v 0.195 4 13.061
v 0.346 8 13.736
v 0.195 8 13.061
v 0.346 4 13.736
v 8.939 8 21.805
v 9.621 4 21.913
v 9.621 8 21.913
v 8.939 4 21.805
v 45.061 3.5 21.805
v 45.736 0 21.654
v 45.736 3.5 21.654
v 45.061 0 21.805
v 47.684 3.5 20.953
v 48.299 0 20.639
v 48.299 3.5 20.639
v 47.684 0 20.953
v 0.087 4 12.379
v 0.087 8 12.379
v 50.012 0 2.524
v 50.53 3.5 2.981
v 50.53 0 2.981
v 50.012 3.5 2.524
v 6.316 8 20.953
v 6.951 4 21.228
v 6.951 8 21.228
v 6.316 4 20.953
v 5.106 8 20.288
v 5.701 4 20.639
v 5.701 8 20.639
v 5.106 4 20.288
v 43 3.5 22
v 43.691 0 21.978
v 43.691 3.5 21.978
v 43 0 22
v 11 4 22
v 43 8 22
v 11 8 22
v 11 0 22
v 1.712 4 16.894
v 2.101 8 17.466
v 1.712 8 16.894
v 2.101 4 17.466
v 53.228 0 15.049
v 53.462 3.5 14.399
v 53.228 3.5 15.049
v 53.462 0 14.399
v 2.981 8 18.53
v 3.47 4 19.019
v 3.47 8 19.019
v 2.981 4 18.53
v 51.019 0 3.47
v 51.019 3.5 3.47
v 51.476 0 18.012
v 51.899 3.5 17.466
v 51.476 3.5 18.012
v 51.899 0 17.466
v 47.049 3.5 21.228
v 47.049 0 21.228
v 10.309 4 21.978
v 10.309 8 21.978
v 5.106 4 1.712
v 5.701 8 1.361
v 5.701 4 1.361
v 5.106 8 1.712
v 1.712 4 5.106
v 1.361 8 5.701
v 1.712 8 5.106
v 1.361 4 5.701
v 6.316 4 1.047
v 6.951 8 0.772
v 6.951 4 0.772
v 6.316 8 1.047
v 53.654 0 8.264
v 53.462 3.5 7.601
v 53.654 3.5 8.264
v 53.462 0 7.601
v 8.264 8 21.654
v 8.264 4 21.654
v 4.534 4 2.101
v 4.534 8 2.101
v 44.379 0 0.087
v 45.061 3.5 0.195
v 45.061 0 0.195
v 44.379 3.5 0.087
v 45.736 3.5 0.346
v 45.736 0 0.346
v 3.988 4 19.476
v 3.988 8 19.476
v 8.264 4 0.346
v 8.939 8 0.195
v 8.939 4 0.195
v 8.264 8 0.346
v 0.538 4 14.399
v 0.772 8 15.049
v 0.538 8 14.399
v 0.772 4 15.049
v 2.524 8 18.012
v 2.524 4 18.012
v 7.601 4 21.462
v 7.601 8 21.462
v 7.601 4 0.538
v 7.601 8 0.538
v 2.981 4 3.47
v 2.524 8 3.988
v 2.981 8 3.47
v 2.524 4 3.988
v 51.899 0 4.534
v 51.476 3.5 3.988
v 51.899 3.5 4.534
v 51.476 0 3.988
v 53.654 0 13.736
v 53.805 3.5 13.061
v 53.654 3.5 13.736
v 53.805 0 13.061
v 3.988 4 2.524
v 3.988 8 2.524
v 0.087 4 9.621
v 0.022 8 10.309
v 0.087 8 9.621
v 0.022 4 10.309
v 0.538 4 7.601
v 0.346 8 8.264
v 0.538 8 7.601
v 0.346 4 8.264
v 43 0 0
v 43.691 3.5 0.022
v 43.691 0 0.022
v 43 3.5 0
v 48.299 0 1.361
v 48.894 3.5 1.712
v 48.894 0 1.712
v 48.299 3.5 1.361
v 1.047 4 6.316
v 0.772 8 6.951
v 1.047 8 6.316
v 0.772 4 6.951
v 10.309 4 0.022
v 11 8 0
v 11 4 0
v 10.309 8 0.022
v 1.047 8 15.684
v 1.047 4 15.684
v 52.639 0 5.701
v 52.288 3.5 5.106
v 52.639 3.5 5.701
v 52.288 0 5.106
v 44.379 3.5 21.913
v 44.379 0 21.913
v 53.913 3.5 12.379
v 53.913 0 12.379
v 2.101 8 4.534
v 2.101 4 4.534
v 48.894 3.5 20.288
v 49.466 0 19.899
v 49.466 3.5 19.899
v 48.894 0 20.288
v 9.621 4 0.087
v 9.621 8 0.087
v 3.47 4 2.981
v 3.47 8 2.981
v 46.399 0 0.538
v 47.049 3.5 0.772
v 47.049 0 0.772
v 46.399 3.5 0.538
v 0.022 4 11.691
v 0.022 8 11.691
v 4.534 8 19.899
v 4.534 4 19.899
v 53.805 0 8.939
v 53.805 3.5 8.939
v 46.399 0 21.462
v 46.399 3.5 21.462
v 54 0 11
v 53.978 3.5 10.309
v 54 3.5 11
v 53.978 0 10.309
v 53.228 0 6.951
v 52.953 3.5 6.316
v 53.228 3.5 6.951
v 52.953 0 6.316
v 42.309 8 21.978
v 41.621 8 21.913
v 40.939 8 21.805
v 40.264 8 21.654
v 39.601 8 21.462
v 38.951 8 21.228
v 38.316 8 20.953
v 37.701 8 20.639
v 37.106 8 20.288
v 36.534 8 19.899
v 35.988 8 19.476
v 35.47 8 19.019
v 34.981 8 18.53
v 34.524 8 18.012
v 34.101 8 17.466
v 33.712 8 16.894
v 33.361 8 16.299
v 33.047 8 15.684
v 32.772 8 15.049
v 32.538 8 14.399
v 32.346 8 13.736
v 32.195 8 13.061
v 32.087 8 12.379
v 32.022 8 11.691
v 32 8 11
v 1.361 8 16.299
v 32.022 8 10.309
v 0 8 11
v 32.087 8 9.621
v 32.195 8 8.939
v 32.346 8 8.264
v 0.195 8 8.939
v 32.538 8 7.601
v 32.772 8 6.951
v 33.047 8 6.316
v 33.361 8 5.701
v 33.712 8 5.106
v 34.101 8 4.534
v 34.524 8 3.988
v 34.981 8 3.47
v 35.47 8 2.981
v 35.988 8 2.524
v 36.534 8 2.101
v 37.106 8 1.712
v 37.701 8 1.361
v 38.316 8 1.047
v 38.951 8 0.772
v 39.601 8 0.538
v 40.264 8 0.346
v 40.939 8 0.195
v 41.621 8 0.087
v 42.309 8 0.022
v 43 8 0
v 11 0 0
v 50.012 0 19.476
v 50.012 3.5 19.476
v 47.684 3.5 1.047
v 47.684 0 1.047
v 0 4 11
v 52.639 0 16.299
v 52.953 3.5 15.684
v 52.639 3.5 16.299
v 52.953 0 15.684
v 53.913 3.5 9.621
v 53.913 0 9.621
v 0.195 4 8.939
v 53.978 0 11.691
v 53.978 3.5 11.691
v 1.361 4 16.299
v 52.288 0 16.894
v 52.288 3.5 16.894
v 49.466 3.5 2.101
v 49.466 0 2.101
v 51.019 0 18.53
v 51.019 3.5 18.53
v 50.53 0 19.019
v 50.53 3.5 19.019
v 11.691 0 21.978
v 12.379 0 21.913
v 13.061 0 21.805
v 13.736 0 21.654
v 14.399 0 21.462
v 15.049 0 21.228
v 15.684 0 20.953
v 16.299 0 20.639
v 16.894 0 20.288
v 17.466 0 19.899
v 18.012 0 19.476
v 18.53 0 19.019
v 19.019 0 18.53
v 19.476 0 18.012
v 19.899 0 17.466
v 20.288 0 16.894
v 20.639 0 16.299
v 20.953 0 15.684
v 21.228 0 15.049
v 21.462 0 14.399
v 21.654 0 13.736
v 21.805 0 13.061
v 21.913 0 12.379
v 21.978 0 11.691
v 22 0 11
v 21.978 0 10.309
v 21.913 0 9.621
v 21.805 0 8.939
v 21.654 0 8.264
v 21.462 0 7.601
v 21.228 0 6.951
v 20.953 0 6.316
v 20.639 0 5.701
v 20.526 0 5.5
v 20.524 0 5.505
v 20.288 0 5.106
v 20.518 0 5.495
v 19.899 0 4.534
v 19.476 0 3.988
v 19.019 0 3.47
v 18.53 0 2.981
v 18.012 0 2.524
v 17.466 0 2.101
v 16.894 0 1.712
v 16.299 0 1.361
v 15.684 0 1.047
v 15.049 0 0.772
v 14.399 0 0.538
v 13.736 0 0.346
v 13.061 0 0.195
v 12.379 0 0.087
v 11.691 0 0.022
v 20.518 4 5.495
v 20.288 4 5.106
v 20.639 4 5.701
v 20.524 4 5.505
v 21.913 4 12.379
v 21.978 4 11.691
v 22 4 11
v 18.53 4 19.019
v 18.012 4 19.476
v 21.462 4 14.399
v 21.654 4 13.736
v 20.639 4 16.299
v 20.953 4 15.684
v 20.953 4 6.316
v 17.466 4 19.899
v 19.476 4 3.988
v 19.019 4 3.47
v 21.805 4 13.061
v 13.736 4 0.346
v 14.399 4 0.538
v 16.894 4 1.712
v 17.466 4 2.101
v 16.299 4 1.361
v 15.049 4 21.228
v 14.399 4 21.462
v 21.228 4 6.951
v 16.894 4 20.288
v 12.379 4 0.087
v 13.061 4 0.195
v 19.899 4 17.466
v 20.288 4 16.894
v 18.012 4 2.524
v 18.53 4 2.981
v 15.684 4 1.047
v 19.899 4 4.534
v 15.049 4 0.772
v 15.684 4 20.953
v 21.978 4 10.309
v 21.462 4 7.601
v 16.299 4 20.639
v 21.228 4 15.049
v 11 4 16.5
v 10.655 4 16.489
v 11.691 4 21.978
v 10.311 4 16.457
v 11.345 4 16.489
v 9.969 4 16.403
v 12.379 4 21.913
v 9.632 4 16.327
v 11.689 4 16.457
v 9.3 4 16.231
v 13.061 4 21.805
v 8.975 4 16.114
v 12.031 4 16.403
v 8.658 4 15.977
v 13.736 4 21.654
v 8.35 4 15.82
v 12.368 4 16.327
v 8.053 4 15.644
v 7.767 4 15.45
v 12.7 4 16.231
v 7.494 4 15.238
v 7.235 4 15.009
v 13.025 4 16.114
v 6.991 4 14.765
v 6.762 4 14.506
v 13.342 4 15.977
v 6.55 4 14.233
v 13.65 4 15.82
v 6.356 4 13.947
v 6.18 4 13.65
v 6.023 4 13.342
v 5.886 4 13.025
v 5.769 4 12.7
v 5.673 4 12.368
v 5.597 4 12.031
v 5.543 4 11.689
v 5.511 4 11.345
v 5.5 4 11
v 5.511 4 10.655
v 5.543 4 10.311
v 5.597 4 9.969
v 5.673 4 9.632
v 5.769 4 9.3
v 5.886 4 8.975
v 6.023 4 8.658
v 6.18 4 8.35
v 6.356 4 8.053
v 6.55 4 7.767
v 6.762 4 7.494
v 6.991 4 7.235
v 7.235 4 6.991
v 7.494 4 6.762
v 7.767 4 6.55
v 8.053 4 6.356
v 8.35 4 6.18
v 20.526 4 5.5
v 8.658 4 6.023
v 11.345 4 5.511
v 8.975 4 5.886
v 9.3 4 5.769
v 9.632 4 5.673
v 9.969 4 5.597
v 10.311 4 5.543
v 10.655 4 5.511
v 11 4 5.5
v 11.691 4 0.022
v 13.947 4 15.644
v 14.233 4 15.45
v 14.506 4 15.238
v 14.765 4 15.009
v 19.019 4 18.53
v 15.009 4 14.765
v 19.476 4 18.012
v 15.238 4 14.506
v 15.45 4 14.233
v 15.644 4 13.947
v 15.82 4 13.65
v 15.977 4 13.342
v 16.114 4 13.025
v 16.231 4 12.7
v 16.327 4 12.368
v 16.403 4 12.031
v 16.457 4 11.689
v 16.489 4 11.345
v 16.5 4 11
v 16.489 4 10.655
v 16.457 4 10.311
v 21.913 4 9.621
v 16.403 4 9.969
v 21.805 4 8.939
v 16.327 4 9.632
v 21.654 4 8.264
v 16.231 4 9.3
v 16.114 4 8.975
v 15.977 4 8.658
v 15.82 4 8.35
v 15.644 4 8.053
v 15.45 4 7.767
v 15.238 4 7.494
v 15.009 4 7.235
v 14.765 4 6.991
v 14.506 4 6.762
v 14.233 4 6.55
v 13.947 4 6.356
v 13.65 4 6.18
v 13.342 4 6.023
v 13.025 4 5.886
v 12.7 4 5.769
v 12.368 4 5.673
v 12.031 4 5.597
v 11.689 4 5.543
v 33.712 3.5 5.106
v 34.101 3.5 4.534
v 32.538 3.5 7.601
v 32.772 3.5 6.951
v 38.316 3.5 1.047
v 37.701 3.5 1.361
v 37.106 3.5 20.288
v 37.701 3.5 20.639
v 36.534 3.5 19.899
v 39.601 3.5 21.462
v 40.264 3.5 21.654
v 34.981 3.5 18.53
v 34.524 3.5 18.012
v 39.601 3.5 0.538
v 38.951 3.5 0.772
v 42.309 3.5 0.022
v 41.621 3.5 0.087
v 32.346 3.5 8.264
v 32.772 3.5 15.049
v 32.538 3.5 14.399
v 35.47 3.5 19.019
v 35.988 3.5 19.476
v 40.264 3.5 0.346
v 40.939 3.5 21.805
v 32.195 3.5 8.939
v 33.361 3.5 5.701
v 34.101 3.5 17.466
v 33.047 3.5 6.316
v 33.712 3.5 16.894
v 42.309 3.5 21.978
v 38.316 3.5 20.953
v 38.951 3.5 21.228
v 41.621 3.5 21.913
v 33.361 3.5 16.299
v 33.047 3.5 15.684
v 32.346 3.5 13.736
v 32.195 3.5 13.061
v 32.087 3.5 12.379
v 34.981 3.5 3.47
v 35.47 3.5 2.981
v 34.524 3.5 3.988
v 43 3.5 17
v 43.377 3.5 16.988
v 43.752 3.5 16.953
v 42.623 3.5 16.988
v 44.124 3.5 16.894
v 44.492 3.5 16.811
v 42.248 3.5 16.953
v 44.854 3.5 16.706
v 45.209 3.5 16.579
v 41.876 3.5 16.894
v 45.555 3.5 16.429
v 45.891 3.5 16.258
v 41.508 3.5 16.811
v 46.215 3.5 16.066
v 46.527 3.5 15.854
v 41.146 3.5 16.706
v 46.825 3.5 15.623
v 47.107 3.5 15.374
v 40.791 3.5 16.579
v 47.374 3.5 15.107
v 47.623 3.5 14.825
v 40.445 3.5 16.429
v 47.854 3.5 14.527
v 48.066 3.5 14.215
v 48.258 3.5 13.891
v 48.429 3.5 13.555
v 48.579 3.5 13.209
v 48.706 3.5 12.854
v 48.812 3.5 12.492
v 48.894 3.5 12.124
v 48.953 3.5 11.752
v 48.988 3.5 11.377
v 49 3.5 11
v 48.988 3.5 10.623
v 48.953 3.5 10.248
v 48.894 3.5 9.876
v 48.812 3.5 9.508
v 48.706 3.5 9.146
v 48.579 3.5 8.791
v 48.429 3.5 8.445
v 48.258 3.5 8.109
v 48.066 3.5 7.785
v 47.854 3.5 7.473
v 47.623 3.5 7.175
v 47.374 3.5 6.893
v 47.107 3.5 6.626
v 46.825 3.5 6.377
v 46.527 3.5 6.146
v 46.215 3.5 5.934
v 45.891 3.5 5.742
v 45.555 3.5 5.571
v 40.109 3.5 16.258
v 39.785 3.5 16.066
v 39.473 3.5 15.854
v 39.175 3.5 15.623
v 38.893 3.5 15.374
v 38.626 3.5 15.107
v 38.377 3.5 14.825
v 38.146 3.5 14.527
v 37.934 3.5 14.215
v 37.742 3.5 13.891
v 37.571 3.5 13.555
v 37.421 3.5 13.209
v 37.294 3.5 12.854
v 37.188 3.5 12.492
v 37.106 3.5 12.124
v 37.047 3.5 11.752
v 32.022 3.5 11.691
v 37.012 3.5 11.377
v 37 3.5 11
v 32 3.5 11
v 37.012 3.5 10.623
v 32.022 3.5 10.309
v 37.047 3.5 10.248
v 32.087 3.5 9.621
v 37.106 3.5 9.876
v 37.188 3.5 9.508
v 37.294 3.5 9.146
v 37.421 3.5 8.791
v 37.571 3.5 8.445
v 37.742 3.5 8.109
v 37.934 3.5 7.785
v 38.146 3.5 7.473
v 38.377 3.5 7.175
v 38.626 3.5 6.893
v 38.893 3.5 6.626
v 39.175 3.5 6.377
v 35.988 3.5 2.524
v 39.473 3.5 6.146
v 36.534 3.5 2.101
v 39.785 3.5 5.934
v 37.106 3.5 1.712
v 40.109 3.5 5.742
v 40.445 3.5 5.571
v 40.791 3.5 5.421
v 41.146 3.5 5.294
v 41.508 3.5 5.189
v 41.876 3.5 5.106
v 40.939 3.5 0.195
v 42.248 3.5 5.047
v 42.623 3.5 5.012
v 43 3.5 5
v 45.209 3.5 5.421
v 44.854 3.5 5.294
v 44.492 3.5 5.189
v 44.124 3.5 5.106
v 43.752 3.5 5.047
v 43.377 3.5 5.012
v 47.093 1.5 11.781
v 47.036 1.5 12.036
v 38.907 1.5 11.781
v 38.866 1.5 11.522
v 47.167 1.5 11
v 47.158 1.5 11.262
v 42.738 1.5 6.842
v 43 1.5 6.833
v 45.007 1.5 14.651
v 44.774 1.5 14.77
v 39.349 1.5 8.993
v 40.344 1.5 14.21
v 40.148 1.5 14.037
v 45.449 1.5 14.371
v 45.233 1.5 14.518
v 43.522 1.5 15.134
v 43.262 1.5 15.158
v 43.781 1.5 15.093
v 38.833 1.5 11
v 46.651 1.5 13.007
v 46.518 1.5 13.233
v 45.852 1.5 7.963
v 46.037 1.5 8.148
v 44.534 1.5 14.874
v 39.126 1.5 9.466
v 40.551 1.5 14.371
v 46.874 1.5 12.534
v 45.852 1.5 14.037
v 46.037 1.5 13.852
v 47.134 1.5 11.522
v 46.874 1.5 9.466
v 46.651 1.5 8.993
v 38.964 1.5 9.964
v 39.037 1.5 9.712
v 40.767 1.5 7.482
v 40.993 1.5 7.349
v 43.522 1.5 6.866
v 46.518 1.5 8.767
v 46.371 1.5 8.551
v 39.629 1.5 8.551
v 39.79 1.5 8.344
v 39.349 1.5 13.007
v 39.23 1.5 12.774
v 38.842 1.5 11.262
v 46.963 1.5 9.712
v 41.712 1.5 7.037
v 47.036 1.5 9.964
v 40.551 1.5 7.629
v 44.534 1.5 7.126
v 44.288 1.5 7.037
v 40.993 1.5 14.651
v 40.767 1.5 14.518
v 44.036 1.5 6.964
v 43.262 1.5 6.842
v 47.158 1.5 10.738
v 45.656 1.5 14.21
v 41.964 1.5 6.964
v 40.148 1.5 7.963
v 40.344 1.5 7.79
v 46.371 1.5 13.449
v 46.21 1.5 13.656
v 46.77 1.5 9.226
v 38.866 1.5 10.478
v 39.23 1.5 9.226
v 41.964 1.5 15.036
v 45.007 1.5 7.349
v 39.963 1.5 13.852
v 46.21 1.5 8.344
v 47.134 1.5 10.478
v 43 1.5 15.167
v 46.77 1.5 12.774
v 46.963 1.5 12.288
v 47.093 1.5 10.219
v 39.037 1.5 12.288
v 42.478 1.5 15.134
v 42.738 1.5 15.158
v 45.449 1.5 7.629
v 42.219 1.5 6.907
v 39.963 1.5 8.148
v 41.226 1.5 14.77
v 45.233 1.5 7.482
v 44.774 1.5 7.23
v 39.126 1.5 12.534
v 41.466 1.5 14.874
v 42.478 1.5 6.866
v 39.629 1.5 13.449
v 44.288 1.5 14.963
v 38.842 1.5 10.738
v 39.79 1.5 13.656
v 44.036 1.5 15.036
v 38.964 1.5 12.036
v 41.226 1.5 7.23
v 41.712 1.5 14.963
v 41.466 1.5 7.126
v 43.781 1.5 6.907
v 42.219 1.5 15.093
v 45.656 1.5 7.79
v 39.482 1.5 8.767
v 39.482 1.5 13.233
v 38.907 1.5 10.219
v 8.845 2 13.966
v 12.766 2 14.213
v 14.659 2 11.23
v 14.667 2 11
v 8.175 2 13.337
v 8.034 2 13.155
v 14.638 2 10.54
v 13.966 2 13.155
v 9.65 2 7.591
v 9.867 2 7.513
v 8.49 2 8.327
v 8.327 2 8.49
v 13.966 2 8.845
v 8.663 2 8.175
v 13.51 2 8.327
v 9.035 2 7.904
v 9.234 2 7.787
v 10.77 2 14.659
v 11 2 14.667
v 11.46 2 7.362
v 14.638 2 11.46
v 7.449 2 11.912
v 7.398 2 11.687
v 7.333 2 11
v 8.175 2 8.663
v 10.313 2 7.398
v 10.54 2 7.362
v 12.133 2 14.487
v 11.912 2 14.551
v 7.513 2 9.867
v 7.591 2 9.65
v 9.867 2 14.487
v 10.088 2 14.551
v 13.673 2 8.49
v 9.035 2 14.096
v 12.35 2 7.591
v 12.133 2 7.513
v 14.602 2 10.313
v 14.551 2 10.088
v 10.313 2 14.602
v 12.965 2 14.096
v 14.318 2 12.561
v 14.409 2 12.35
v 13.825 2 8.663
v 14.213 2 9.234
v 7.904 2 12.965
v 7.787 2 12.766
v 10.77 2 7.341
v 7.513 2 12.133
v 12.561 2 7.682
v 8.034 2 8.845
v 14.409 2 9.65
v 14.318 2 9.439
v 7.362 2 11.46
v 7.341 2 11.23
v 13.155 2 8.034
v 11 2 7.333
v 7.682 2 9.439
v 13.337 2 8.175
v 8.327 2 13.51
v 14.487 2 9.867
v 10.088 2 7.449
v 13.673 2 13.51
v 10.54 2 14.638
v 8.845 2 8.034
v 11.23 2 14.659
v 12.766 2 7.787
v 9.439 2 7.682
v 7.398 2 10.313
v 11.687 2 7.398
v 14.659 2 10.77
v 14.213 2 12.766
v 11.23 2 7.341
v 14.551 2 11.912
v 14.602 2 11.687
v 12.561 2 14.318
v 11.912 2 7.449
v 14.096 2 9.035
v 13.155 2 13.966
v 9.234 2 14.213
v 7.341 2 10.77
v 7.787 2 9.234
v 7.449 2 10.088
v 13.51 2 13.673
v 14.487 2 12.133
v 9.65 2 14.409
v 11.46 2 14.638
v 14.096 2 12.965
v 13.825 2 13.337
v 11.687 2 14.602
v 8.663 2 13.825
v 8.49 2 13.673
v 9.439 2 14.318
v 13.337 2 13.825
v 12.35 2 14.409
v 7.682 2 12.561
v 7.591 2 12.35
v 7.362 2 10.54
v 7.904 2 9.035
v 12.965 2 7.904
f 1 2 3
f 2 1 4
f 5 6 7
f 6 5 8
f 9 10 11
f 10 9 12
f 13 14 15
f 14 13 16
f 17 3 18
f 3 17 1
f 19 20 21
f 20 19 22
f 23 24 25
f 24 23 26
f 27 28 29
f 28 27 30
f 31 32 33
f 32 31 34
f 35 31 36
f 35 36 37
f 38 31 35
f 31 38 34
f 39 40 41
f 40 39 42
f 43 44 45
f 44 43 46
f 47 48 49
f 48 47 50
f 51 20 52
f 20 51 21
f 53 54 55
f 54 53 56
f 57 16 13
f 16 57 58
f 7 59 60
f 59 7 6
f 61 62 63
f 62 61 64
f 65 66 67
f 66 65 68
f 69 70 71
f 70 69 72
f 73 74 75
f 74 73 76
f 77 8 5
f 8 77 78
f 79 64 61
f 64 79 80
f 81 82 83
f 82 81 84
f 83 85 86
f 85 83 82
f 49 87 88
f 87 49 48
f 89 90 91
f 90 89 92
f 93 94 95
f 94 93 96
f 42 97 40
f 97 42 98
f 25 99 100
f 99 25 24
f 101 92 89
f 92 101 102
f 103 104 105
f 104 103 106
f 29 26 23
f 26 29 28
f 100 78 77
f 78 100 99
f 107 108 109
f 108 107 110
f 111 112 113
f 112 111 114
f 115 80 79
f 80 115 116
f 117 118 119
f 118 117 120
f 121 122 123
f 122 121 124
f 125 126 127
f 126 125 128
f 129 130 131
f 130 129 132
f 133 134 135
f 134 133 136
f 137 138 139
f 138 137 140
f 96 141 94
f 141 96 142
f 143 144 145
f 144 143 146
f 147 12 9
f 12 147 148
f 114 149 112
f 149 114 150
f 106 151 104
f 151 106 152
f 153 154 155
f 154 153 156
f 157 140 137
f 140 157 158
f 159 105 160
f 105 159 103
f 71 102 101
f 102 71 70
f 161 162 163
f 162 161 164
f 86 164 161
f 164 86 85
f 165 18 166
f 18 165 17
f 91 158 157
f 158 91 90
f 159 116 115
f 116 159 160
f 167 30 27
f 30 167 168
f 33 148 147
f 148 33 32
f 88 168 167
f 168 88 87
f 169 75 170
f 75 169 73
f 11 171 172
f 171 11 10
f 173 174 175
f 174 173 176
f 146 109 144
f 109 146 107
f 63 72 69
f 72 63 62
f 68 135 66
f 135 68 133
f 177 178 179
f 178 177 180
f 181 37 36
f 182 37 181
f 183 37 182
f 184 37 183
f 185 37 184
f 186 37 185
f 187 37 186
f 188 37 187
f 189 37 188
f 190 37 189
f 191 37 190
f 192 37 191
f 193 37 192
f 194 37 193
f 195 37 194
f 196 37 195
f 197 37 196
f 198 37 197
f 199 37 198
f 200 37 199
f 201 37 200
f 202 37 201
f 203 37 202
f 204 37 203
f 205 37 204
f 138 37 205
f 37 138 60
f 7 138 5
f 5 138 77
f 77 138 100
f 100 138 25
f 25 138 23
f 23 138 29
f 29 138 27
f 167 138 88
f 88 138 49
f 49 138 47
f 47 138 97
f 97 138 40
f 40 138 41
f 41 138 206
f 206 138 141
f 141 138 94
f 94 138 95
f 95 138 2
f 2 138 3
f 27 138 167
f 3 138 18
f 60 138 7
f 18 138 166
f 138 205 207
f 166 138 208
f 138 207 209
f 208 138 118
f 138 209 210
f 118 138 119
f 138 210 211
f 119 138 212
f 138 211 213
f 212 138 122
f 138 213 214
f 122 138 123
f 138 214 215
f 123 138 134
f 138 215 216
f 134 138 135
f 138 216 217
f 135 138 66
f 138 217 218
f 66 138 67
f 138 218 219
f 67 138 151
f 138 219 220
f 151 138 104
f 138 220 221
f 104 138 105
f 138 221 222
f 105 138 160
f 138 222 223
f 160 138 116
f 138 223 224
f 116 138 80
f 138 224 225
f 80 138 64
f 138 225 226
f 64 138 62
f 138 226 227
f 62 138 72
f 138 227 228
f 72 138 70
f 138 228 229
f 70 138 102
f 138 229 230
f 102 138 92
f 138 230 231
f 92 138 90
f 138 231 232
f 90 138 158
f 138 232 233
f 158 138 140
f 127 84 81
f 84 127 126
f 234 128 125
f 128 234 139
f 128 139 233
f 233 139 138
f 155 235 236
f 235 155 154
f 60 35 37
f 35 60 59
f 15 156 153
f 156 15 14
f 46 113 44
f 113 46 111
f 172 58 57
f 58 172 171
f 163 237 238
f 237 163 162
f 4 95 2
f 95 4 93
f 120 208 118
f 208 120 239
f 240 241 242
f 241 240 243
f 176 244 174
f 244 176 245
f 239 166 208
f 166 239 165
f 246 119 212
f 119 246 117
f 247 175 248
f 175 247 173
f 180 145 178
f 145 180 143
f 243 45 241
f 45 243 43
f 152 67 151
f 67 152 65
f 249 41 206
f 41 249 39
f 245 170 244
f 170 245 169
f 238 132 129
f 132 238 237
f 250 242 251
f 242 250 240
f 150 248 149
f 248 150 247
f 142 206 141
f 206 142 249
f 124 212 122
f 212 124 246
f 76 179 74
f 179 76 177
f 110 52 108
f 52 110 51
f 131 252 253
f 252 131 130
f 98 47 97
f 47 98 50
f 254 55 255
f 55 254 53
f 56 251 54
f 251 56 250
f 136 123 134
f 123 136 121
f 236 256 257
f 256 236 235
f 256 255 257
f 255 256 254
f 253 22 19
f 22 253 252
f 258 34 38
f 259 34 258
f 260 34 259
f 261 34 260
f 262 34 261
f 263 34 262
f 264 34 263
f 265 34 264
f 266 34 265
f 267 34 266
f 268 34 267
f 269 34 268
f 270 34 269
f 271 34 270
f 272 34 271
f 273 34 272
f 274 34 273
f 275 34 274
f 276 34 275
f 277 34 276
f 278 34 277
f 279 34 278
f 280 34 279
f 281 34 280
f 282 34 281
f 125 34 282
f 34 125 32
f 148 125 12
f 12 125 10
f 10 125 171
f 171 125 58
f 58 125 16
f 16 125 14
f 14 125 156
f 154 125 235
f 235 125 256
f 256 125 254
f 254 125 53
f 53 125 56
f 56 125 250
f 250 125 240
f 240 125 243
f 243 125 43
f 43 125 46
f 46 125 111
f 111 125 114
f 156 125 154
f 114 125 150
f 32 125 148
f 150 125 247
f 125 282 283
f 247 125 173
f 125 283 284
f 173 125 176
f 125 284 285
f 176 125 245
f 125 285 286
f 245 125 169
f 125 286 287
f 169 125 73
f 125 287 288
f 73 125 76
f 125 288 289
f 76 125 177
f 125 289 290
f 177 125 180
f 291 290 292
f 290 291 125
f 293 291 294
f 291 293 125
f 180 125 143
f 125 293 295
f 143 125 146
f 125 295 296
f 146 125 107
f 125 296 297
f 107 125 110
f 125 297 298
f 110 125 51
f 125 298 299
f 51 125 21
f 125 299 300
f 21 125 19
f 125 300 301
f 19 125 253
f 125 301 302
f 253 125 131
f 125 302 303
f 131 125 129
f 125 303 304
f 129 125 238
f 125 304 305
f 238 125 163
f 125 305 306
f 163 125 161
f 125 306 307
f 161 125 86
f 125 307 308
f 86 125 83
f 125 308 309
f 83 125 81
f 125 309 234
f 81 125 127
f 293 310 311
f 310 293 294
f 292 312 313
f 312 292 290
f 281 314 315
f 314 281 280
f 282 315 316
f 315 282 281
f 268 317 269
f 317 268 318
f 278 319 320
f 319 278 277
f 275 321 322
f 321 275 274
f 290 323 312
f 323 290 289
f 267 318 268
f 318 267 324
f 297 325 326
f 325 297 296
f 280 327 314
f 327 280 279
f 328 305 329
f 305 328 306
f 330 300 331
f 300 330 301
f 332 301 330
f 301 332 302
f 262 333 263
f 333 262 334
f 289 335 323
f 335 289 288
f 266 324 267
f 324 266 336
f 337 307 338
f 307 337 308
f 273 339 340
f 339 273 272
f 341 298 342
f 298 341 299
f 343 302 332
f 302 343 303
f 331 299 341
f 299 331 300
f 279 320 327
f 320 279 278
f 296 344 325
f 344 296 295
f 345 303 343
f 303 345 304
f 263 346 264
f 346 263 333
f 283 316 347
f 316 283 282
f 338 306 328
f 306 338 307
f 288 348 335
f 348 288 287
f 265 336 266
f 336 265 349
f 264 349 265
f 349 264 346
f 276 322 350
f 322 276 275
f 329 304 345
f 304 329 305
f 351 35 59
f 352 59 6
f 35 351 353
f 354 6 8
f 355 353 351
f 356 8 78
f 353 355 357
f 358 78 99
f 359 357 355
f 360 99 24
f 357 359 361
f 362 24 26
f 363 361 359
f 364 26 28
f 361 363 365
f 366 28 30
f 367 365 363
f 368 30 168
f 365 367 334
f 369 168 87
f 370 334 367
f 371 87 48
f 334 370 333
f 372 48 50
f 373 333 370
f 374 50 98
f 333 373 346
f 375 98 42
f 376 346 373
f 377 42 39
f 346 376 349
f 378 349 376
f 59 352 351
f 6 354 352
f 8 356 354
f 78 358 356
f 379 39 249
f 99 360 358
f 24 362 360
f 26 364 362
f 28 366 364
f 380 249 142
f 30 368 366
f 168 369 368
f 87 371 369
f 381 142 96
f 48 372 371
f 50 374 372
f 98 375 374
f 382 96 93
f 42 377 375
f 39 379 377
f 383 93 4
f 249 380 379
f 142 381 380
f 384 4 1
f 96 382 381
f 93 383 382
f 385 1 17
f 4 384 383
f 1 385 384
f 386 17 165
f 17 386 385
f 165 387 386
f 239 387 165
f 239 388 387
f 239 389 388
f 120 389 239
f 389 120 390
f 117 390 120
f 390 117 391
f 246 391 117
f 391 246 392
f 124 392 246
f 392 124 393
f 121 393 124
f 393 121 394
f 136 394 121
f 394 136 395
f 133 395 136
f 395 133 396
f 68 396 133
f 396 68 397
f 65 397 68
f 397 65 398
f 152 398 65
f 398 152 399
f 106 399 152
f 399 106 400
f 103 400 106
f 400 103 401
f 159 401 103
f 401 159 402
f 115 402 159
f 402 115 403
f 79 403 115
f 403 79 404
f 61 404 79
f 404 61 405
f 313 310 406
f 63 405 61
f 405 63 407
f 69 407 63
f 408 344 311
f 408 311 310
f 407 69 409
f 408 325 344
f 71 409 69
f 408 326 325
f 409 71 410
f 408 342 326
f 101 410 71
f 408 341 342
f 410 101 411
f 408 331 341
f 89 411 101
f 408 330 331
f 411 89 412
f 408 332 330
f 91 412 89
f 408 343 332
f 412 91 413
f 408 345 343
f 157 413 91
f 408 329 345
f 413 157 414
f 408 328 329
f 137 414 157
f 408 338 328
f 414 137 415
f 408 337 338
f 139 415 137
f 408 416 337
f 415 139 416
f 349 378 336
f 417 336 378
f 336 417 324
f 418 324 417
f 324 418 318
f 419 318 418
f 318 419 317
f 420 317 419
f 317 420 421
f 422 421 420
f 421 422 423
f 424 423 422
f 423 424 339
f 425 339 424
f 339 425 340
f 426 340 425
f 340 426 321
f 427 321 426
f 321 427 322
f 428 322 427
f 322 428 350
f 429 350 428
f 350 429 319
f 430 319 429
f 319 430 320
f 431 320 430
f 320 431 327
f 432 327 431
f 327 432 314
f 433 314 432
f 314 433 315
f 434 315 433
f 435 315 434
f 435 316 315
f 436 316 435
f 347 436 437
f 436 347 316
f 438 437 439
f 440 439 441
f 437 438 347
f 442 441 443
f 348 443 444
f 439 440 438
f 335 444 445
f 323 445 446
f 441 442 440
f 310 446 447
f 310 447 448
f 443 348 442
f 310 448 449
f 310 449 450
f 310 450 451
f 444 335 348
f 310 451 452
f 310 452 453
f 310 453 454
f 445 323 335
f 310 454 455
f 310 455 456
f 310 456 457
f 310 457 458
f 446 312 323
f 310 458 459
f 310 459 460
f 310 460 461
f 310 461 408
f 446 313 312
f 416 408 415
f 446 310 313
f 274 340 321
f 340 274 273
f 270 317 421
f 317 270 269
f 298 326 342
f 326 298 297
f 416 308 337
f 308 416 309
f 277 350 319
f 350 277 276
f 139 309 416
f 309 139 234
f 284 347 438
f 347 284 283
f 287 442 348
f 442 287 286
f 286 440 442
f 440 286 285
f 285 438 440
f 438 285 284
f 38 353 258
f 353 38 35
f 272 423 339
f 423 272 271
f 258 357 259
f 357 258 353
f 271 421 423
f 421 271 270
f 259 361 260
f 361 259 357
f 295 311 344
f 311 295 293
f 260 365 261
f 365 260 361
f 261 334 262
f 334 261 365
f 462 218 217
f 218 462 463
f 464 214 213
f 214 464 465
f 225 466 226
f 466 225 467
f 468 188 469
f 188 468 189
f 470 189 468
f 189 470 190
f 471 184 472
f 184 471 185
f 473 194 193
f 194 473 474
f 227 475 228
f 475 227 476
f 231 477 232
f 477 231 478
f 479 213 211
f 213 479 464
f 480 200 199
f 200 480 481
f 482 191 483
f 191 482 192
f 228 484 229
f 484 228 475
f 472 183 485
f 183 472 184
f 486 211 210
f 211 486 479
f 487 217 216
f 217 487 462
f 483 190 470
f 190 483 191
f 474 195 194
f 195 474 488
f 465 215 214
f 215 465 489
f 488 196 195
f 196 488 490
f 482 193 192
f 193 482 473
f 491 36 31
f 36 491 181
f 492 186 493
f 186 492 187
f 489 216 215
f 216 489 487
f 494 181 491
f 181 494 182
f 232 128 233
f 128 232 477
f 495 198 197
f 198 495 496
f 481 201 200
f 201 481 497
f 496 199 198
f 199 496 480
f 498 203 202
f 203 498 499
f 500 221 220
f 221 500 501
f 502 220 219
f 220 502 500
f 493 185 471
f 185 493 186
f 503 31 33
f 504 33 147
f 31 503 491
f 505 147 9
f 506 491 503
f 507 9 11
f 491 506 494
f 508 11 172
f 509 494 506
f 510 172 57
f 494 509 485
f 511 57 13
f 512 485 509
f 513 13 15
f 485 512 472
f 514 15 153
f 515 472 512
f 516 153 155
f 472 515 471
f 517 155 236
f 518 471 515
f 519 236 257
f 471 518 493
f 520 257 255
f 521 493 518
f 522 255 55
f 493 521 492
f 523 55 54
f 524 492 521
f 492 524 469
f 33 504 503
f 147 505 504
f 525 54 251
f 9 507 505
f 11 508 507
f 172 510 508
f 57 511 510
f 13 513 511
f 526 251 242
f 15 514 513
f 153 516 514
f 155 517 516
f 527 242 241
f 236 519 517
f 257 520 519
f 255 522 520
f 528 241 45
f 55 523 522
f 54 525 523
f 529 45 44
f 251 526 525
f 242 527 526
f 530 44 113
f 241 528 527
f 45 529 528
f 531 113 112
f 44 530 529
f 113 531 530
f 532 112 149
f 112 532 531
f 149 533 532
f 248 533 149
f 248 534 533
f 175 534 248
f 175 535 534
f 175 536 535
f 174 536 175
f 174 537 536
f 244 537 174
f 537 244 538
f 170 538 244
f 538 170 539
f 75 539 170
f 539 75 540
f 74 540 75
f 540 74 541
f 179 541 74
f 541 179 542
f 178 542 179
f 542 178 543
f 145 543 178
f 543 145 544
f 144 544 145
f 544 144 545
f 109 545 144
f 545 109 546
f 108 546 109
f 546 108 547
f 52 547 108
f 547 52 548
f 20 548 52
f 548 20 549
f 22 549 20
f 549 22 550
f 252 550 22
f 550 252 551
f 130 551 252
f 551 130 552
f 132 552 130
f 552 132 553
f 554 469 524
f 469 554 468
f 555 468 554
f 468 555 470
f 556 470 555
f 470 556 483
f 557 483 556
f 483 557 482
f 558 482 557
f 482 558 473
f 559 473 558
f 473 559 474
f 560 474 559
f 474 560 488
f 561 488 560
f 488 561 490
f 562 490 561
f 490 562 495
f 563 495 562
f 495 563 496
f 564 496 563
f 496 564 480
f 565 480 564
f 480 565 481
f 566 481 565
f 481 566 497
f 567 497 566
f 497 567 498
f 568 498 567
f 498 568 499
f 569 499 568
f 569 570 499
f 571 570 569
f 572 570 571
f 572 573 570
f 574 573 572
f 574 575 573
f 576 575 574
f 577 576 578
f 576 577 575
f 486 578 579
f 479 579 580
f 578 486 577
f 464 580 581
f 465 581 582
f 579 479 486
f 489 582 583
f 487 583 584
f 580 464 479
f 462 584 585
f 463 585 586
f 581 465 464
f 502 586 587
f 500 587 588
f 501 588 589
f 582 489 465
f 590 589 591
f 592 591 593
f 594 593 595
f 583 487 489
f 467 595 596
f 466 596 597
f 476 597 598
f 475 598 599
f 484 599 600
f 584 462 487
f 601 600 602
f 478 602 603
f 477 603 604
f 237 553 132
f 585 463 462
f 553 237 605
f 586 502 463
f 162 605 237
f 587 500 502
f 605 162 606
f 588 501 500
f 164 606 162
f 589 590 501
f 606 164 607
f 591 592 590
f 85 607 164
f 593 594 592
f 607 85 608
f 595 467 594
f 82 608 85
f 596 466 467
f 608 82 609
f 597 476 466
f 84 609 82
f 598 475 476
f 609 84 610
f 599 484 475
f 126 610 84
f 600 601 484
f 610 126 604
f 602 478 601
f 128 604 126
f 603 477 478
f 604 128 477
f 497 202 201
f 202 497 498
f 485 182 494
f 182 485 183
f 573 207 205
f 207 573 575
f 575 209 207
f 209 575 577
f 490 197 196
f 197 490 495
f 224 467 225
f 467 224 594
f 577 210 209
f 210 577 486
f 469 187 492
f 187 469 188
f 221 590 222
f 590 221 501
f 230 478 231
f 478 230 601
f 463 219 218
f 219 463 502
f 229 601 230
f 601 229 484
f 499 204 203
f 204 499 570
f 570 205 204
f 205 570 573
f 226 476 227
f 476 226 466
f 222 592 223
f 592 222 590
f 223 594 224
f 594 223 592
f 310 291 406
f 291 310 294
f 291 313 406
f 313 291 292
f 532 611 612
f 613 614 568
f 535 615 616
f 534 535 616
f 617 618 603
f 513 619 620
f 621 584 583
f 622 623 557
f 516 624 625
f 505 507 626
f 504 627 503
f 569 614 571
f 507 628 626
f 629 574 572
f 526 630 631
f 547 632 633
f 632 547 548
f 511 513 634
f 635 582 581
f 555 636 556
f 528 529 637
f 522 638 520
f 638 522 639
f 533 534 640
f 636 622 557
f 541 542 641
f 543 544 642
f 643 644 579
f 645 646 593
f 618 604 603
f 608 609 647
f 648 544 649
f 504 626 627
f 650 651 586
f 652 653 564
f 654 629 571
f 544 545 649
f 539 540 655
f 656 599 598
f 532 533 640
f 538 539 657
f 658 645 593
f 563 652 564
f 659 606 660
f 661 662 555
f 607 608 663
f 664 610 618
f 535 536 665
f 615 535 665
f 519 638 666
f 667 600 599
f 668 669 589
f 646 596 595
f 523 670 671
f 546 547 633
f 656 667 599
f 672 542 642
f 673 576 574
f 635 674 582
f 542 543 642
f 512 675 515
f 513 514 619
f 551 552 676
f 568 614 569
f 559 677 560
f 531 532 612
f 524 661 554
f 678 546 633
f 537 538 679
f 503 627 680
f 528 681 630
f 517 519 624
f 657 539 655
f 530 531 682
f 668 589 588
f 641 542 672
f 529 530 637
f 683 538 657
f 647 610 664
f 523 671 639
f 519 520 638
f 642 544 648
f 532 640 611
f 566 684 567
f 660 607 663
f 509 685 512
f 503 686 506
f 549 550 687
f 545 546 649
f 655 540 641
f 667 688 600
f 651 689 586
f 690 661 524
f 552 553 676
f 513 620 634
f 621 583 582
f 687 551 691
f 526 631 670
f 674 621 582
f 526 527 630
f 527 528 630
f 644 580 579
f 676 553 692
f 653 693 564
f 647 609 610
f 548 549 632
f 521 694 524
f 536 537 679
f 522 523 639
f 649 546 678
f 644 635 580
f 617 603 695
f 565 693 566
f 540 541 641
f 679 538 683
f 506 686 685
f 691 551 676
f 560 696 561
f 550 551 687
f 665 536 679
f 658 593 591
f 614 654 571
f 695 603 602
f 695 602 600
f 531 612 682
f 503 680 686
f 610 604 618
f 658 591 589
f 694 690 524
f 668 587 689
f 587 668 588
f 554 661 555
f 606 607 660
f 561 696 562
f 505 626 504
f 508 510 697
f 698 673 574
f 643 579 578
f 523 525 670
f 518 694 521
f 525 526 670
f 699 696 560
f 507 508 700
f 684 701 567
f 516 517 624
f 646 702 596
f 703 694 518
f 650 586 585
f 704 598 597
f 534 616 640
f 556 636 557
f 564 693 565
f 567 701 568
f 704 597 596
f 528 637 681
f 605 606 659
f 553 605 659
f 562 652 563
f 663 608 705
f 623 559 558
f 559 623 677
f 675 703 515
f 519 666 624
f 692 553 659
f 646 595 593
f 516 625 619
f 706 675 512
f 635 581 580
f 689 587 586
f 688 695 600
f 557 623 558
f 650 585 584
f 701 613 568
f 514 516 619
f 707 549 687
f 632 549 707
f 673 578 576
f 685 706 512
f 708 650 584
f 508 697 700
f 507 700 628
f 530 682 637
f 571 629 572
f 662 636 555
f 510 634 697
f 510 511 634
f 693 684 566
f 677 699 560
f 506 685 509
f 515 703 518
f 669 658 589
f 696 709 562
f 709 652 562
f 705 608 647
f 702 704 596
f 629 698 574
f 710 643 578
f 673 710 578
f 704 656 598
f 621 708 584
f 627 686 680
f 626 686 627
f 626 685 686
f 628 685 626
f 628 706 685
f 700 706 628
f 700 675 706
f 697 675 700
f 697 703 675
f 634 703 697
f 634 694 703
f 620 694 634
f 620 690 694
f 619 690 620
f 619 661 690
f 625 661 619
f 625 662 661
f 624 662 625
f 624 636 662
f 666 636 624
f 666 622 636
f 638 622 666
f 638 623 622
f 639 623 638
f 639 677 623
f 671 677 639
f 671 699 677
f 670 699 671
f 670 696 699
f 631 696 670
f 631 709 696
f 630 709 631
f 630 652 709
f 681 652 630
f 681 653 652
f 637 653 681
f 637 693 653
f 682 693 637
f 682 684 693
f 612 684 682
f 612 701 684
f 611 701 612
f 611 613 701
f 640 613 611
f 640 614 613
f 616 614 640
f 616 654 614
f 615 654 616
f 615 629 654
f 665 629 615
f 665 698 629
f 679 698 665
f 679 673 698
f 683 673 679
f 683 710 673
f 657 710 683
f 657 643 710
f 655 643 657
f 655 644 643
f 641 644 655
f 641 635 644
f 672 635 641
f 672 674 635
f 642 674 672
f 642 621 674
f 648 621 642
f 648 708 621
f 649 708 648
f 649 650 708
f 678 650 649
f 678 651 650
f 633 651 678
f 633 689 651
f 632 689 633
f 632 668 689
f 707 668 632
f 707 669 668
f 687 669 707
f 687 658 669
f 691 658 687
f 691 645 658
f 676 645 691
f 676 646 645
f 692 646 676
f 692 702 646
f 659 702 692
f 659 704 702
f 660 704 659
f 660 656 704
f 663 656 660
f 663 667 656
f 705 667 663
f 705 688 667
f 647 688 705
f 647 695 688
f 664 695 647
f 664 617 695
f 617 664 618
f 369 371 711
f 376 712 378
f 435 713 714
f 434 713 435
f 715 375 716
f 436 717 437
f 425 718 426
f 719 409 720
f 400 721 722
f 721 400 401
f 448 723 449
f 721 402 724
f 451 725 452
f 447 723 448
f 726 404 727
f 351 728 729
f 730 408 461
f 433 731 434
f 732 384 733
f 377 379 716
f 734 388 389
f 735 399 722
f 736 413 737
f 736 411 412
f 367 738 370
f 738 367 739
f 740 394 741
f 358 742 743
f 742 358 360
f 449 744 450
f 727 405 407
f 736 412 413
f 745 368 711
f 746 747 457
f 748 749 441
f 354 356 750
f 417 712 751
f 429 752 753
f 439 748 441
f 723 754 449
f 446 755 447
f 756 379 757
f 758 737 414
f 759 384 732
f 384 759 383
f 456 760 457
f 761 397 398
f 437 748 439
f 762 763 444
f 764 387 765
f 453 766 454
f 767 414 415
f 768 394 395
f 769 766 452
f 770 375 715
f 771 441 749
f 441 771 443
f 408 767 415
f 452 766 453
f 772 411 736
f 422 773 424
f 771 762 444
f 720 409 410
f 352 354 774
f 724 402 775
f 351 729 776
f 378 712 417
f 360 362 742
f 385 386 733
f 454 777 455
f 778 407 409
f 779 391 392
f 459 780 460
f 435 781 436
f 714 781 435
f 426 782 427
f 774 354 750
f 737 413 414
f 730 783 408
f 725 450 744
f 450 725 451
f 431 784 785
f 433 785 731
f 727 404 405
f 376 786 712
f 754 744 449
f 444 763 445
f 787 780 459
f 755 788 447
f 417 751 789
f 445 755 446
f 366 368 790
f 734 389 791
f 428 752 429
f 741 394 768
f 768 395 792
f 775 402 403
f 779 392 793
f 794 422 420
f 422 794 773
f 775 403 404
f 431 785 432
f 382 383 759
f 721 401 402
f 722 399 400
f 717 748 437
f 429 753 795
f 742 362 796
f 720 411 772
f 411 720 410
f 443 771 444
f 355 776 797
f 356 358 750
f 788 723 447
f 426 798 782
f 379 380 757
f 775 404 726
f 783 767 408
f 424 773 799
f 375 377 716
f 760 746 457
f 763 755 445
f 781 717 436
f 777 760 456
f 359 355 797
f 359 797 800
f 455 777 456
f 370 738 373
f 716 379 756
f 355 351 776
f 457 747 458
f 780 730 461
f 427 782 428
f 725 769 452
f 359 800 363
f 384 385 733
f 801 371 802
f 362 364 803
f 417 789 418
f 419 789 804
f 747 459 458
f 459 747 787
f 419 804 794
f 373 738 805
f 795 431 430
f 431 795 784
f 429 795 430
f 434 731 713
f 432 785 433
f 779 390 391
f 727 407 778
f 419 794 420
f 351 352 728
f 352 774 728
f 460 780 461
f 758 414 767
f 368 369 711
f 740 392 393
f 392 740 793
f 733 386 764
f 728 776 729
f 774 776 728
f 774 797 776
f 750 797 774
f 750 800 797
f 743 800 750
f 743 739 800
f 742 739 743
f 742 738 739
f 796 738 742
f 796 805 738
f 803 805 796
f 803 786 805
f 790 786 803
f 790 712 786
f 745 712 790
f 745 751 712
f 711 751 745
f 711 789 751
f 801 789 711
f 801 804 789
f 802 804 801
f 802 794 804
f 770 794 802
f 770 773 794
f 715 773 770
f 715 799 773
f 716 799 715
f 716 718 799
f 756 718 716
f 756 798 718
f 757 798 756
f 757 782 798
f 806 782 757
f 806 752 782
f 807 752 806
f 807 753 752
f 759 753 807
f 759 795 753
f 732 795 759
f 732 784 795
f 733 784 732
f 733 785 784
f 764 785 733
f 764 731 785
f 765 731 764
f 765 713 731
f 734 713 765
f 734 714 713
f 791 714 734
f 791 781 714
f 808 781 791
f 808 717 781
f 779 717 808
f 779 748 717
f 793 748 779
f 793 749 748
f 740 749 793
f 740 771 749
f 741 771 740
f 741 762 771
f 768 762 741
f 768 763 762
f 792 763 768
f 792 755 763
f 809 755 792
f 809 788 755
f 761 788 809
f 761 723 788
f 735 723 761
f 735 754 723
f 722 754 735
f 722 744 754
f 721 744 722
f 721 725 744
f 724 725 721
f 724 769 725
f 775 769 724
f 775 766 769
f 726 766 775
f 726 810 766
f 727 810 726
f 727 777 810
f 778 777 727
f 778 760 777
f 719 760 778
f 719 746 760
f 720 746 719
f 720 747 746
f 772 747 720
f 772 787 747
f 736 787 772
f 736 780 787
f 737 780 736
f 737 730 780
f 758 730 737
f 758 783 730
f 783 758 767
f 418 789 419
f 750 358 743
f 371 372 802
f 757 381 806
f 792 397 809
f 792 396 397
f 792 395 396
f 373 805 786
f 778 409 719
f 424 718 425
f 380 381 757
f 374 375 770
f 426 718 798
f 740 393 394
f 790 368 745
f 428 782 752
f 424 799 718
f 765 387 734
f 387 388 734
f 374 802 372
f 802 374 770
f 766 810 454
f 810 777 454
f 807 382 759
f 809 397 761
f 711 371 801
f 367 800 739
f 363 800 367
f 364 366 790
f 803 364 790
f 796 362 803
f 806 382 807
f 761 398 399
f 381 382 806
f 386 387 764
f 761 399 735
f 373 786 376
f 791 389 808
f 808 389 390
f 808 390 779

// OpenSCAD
$fn = 100;

// Angle is with respect to a unit circle
function getTangentPoint(center, radius, angle) =
    let(xp = radius * cos(angle), yp = radius * sin(angle))
    [center[0] + xp, center[1] + yp];


module SideWall(h, l, w) {
    hull(){
        translate([h / 2, w, h / 2]){rotate([90, 0, 0]){
            cylinder(d = h, h = w);
        }}
    
        translate([l - (h / 2), w, h/ 2]){rotate([90, 0, 0]){
            cylinder(d = h, h = w);
        }}
    }
}

module LinkWall(h, l, w, a){
    union(){
        difference(){
            union(){
                SideWall(h, l, w);
            }
            translate([h / 2, w / 2, h / 2]){rotate([90, 0, 0]){
                cylinder(d = h, h = w / 2);
            }}
            
            translate([l - (h / 2), w, h / 2]){rotate([90, 0, 0]){
                cylinder(d = h, h = w / 2 + 0.5);
            }}
            
            translate(let(y = getTangentPoint([h / 2, h / 2], h / 2, a)) [y[0] + 4*sin(a), 0, y[1] + 4*cos(a)]){rotate([0, a + 180, 0]){
                cube([h / 2, w / 2, 4]);
            }}
            
            translate([l - (h / 2), w / 2 - 0.5, h / 2]){rotate([90, 0, 0]){
                cylinder(h = w / 4, r1 = (h / 4) + 0.5, r2 = (h / 6) + 0.5);
            }}
        }
        translate([h / 2, w / 2, h / 2]){rotate([90, 0, 0]){
            cylinder(h = w / 4, r1 = h / 4, r2 = h / 6);
        }}
    }
}

LinkWall(22, 54, 8, 330);
